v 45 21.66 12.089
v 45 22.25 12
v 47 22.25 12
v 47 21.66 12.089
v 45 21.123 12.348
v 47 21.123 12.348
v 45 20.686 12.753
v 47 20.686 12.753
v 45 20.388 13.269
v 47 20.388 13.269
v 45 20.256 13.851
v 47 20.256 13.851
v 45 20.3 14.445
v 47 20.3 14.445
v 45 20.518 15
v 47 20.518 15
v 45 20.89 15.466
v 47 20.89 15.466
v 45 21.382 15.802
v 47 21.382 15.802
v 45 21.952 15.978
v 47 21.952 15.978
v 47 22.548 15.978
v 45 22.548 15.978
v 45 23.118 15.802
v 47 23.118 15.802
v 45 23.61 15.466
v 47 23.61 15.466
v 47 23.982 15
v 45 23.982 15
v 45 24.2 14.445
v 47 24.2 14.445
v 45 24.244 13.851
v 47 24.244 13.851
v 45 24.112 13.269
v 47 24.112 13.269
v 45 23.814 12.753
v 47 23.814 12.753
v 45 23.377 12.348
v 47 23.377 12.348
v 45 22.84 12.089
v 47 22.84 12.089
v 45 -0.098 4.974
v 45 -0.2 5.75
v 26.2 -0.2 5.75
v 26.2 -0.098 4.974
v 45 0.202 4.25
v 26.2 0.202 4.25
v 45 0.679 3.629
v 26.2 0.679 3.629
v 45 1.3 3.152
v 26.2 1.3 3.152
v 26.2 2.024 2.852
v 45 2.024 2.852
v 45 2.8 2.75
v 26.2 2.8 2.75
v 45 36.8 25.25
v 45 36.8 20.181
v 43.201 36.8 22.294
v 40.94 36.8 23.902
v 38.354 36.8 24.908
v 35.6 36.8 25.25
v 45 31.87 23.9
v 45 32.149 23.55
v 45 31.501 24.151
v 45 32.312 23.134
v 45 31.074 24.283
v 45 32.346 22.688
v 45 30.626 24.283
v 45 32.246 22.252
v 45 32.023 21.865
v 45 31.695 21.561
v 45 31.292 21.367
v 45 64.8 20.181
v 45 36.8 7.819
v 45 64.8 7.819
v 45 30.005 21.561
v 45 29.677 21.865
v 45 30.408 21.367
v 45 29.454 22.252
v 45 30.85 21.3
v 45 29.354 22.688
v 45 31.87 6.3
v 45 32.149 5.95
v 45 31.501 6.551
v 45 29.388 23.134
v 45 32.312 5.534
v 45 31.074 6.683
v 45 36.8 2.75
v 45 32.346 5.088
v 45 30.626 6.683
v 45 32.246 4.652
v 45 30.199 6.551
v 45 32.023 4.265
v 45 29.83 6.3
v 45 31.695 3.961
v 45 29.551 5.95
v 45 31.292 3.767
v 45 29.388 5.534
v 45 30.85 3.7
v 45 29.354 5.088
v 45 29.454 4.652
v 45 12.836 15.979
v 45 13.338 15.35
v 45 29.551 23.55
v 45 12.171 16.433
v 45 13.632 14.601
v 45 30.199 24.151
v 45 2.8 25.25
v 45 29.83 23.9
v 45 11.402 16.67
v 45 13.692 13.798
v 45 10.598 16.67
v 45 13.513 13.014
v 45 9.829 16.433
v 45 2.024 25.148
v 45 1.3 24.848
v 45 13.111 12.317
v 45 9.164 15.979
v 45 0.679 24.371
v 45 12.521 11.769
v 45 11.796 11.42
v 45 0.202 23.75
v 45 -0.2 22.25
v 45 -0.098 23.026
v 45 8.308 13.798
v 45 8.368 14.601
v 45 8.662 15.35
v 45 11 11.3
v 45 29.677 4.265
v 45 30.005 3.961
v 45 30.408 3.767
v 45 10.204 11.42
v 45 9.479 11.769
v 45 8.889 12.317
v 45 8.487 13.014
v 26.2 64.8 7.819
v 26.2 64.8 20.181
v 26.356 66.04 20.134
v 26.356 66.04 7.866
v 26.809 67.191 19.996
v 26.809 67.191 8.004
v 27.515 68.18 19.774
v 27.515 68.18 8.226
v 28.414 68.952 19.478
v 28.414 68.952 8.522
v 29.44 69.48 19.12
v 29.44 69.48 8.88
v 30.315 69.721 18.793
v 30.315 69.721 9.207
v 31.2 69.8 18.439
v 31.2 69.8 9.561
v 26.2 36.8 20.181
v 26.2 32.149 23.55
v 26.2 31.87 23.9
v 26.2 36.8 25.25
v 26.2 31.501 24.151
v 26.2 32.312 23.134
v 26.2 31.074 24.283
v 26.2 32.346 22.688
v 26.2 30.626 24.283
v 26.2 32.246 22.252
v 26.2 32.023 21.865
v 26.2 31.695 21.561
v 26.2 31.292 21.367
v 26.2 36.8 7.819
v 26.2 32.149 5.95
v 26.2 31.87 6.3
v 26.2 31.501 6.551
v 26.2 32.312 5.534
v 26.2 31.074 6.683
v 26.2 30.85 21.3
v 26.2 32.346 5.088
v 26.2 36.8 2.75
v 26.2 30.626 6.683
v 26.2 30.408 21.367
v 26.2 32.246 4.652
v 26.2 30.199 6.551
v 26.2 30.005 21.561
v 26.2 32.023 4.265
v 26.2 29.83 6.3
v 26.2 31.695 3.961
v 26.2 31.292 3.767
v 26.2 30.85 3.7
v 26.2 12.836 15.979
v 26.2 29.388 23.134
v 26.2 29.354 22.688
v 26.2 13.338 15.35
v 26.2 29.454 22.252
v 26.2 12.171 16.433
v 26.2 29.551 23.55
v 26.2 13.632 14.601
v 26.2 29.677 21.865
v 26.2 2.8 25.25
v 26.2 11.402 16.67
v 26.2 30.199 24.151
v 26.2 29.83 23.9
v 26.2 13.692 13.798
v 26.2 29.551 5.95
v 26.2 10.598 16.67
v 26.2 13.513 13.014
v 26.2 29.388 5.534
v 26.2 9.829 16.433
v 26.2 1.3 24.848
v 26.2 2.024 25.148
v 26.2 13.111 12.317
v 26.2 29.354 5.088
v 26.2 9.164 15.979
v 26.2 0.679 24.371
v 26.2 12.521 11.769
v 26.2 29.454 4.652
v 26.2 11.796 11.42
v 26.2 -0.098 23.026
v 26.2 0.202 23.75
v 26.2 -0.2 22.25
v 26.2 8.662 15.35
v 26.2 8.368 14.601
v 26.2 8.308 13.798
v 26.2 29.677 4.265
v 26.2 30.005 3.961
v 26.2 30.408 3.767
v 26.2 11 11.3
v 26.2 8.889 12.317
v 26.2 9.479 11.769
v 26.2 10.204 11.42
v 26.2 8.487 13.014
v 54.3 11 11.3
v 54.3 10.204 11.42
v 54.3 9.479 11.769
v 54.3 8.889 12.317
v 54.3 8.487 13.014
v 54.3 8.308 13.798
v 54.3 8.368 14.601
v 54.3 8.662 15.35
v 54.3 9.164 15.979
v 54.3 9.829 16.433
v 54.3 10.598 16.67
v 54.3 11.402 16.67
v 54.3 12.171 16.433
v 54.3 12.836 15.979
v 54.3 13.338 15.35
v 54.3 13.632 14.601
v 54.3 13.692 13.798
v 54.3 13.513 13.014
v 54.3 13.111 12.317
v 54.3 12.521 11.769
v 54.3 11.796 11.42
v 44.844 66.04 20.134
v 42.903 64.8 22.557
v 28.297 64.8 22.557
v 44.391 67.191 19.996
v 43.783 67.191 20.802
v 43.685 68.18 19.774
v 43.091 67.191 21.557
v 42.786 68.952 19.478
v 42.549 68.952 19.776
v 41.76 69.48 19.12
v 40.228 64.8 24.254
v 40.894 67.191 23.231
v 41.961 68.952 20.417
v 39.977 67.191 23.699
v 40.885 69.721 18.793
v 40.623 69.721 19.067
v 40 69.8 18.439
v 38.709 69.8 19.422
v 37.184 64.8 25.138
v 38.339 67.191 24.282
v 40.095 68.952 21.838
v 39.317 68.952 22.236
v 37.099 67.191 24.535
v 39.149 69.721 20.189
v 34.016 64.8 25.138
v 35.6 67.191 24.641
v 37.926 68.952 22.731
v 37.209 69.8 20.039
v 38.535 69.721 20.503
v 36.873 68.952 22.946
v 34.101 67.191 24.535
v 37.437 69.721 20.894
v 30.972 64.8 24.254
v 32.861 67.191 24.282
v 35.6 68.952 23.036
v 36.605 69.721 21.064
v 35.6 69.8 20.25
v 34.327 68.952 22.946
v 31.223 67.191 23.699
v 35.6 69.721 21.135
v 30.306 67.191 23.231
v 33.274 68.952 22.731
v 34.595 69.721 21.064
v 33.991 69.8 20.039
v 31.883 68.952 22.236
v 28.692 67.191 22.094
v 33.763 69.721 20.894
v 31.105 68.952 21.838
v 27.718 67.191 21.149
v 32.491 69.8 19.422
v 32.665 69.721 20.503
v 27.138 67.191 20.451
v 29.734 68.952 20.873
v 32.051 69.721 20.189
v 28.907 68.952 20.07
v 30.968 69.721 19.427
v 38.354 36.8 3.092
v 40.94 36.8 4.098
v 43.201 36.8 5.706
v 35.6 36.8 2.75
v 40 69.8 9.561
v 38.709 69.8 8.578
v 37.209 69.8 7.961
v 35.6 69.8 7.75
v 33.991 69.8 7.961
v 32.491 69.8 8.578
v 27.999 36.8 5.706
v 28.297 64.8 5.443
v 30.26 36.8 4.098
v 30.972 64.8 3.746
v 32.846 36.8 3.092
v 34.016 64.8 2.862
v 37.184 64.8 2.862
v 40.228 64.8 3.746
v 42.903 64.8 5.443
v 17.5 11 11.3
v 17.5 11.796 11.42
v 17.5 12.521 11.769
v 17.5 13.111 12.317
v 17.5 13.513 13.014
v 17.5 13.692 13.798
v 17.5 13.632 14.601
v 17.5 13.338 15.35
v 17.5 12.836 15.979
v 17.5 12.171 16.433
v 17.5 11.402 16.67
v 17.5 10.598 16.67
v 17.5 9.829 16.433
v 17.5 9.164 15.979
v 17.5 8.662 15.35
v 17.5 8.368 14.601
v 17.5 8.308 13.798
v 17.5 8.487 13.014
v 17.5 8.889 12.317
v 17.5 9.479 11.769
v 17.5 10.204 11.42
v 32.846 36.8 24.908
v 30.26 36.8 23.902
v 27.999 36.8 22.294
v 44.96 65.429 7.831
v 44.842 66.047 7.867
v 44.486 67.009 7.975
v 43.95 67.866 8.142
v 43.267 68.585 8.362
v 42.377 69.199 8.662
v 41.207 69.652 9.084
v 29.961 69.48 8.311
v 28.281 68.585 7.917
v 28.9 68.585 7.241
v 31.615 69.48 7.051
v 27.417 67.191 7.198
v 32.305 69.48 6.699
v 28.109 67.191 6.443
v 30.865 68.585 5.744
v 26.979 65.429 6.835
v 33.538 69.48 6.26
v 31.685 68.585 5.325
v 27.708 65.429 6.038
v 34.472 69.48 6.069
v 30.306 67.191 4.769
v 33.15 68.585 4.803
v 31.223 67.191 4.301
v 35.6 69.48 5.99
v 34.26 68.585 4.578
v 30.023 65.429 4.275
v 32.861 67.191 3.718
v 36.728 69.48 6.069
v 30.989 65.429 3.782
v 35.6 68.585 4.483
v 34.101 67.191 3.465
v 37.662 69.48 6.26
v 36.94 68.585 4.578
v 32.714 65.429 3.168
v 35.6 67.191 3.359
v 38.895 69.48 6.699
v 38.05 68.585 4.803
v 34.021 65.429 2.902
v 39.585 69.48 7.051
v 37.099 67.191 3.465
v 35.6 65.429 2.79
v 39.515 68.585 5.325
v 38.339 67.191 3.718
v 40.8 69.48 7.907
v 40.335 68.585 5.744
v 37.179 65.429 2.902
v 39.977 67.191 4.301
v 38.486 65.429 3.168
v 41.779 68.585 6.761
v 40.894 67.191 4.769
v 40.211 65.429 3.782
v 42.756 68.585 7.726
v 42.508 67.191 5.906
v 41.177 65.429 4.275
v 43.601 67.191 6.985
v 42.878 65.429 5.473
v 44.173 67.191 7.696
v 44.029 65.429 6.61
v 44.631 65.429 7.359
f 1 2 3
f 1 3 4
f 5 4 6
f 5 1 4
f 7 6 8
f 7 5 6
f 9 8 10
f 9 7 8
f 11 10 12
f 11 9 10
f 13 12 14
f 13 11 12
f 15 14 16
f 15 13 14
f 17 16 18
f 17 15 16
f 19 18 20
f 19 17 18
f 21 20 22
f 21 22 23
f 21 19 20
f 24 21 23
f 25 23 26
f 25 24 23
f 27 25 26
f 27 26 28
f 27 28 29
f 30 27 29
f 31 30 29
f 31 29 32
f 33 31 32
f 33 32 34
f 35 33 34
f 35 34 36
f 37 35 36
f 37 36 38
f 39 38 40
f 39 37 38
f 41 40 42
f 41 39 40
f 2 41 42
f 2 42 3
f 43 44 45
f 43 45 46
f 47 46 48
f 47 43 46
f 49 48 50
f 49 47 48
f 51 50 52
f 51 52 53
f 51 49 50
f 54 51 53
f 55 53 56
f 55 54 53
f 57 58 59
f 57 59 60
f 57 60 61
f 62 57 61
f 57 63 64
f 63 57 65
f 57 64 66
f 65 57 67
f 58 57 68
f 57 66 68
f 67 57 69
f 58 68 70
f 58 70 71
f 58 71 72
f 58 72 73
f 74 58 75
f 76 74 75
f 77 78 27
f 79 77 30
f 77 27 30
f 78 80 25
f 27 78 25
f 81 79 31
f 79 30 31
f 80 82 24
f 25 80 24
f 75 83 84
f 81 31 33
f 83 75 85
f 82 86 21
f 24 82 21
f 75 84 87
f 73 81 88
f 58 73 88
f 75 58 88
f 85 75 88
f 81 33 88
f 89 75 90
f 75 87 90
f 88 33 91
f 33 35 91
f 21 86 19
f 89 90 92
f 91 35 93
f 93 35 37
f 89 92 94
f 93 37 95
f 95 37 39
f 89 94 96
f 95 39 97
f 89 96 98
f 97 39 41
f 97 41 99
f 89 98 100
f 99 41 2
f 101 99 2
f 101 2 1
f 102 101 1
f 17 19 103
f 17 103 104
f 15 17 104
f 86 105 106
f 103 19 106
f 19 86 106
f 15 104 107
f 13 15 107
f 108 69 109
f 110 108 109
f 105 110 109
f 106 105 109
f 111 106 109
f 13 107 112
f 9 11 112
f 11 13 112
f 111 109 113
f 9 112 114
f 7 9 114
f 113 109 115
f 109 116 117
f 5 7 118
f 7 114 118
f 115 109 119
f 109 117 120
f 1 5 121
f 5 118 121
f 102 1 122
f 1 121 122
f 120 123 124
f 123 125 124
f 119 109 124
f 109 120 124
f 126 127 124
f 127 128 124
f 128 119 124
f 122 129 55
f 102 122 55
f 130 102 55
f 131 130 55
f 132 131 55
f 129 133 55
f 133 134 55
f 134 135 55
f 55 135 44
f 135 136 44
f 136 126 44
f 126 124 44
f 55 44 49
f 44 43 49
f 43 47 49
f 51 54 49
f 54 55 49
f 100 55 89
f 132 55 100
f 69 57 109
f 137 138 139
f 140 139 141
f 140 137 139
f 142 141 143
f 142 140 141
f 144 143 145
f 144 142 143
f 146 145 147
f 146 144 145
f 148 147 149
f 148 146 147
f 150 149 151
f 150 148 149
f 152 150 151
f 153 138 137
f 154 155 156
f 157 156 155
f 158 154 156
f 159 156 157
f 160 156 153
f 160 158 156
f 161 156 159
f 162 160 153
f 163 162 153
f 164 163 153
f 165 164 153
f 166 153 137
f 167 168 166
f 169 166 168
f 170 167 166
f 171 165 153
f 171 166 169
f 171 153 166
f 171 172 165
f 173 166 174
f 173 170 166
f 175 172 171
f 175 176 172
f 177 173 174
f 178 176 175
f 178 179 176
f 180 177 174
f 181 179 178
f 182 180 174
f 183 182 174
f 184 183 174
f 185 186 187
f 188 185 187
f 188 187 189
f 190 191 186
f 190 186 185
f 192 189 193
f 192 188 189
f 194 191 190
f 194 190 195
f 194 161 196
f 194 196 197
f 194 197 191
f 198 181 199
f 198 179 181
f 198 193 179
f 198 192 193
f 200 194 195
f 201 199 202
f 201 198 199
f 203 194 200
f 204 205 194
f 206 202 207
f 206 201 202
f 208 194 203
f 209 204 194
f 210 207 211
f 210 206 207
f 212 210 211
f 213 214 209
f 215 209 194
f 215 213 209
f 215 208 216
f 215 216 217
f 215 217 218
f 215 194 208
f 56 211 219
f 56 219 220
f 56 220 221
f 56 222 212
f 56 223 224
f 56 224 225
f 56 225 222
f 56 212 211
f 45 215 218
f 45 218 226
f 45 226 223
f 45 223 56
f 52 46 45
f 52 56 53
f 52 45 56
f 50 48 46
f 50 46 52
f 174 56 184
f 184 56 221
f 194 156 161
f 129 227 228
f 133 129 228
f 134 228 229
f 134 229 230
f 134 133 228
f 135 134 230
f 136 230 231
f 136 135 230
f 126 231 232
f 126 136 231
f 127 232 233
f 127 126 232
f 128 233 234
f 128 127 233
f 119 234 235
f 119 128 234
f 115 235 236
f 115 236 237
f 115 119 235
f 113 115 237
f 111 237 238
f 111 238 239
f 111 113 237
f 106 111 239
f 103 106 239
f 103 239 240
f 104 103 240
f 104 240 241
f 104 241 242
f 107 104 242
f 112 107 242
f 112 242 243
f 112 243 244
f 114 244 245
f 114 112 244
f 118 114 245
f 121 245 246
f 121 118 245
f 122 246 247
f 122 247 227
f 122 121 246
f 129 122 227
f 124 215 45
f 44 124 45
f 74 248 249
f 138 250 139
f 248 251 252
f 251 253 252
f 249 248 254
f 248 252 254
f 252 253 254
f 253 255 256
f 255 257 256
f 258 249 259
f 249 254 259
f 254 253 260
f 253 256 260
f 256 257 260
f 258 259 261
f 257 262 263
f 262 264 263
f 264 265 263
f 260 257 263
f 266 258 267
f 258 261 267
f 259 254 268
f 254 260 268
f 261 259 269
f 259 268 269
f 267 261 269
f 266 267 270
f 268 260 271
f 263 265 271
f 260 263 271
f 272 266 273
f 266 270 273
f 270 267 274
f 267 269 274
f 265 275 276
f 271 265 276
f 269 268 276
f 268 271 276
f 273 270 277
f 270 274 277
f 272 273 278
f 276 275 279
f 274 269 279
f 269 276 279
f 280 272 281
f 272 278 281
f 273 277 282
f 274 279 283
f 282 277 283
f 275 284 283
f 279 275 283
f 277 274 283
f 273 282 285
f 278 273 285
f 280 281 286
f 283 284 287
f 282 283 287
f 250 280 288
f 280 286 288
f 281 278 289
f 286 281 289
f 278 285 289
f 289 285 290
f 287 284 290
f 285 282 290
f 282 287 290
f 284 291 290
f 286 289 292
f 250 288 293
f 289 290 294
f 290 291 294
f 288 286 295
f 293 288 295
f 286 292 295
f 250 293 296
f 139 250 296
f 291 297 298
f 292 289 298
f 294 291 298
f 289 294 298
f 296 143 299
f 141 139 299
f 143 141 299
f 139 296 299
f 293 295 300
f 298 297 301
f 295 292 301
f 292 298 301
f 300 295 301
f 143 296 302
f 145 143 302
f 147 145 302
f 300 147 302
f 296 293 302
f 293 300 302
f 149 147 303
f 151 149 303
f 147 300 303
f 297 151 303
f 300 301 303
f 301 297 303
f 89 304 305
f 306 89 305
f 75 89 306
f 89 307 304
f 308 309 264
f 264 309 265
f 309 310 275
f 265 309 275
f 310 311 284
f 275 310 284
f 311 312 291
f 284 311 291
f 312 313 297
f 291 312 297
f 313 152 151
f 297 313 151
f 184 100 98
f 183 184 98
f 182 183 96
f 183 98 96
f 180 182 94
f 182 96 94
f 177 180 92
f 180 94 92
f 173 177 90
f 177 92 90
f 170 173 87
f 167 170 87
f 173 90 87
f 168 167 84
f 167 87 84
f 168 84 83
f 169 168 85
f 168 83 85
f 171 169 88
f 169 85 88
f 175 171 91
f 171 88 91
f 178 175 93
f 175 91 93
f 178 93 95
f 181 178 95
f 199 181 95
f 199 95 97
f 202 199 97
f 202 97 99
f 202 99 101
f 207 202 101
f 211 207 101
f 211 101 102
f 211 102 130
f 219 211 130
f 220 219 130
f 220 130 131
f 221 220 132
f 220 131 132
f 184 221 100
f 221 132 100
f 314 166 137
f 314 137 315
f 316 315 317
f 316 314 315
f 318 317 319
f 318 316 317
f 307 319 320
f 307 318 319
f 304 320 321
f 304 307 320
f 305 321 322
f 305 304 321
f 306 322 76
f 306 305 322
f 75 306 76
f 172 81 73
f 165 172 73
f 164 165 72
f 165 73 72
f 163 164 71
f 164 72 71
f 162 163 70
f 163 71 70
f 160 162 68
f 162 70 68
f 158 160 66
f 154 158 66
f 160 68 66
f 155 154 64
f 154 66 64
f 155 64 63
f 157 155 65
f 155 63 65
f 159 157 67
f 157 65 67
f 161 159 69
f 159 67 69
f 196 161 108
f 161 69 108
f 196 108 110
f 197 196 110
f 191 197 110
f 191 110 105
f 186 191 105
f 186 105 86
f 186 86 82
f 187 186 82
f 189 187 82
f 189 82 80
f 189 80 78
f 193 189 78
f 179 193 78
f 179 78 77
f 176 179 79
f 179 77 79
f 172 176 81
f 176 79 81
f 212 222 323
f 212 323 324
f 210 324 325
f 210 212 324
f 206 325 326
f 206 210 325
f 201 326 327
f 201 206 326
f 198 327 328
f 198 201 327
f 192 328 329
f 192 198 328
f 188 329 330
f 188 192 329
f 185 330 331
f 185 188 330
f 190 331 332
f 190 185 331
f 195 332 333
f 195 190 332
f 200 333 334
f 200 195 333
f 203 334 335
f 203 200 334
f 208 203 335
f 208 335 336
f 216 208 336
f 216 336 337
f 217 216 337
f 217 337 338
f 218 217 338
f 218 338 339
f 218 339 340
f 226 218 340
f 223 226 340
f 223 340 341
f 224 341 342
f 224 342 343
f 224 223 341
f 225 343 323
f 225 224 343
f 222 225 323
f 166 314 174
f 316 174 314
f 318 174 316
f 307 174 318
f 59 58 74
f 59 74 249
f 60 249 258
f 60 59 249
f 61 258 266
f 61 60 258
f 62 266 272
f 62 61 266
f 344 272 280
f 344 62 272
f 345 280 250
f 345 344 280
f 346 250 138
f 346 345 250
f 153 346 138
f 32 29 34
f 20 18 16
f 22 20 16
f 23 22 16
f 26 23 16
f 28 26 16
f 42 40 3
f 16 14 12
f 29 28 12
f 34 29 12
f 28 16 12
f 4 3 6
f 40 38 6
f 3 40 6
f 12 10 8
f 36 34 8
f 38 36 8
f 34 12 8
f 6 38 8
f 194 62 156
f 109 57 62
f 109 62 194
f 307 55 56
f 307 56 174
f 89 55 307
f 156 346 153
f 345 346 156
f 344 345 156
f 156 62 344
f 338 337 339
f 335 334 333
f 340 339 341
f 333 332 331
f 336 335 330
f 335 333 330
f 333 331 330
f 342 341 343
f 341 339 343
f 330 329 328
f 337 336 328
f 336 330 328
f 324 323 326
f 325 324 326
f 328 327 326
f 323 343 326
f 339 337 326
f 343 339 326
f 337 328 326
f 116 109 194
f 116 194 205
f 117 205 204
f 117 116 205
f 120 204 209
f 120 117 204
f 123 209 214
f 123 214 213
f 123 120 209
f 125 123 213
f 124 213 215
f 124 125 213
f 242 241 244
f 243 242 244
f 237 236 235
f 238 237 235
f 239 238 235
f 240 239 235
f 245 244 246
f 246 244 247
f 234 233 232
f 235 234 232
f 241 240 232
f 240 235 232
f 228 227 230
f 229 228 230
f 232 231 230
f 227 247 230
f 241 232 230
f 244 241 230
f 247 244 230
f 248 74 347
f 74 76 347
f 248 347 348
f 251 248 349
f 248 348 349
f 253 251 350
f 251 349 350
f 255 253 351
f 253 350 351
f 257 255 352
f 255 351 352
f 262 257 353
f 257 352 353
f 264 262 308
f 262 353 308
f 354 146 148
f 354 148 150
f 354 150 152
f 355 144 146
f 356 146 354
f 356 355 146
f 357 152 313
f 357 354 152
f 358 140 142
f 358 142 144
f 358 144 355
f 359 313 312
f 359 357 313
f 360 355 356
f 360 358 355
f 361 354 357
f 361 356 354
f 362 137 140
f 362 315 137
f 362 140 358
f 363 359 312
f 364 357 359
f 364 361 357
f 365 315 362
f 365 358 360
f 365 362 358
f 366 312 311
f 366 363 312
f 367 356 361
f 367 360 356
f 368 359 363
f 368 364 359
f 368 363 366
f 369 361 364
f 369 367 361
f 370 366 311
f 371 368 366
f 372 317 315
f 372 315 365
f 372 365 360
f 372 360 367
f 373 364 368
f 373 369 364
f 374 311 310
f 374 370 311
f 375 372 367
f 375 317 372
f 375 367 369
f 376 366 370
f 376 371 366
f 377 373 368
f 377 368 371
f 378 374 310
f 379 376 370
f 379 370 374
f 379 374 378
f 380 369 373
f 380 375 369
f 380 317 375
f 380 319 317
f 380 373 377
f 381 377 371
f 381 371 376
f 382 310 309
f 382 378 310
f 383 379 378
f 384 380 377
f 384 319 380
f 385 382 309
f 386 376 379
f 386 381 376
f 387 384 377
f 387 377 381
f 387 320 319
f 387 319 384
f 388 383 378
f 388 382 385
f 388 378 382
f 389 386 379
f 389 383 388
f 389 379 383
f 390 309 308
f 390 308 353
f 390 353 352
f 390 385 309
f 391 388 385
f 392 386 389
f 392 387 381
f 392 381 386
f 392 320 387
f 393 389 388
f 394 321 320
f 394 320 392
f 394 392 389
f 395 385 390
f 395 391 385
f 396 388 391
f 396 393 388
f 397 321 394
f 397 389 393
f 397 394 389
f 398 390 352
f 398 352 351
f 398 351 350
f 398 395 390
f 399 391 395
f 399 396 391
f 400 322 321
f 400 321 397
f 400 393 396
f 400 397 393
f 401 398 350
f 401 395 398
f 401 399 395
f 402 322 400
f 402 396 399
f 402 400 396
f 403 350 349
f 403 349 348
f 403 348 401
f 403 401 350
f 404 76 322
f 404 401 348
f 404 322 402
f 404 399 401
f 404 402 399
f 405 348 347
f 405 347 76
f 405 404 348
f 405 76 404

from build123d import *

# Parameters (mm, degrees)
SKETCH020_R             = 1.5
PAD012_DEPTH            = 18.8
SKETCH022_R             = 2.7
PAD010_DEPTH            = 8.7
SKETCH023_R             = 2.7
PAD011_DEPTH            = 9.3
PAD003_DEPTH            = 33
FILLET001_R             = 5
SKETCH021_R             = 2
PAD013_DEPTH            = 2
BODY005_PLACEMENT_ANGLE = 90


with BuildPart() as motores_tt:
    # Sketch020 → Pad012 (new body)
    with BuildSketch(Plane.XY):
        with BuildLine():
            Line((-8.25, -11.2), (8.25, -11.2))
            ThreePointArc((8.25, -11.2), (10.3713203436, -10.3213203436), (11.25, -8.2))
            Line((11.25, -8.2), (11.25, 25.8))
            Line((11.25, 25.8), (-11.25, 25.8))
            Line((-11.25, 25.8), (-11.25, -8.2))
            ThreePointArc((-11.25, -8.2), (-10.3713203436, -10.3213203436), (-8.25, -11.2))
        make_face()
        with Locations((-8.8, 19.85)):
            Circle(SKETCH020_R, mode=Mode.SUBTRACT)
        with Locations((8.8, 19.85)):
            Circle(SKETCH020_R, mode=Mode.SUBTRACT)
    extrude(amount=PAD012_DEPTH)

    # Sketch022 (on Face10 of Pad012) → Pad010 (join)
    with BuildSketch(Plane.XY.offset(18.8)):
        Circle(SKETCH022_R)
    extrude(amount=PAD010_DEPTH)

    # Sketch023 (on Face4 of Pad010) → Pad011 (join)
    with BuildSketch(Plane(origin=(0, 0, 0), x_dir=(1, 0, 0), z_dir=(0, 0, -1))):
        Circle(SKETCH023_R)
    extrude(amount=PAD011_DEPTH)

    # Sketch024 (on Face8 of Pad011) → Pad003 (join)
    with BuildSketch(Plane(origin=(0, 25.8, 0), x_dir=(-1, 0, 0), z_dir=(0, 1, 0))):
        with BuildLine():
            ThreePointArc((6.1808170981, 0), (11.25, 9.4), (6.1808170981, 18.8))
            Line((6.1808170981, 18.8), (-6.1808170981, 18.8))
            ThreePointArc((-6.1808170981, 18.8), (-11.25, 9.4), (-6.1808170981, 0))
            Line((6.1808170981, 0), (-6.1808170981, 0))
        make_face()
    extrude(amount=PAD003_DEPTH)

    # Fillet001
    fillet001_edges = [motores_tt.edges().sort_by_distance(p)[0] for p in [
        (-11.25, 58.8, 9.4),
        (0, 58.8, 18.8),
        (11.25, 58.8, 9.4),
        (0, 58.8, 0),
    ]]
    fillet(fillet001_edges, radius=FILLET001_R)

    # Sketch021 (on Face4 of Fillet001) → Pad013 (join)
    with BuildSketch(Plane(origin=(0, 0, 0), x_dir=(1, 0, 0), z_dir=(0, 0, -1))):
        with Locations((0, -11.25)):
            Circle(SKETCH021_R)
    extrude(amount=PAD013_DEPTH)


with BuildPart() as motores_tt_1:
    # Body005 placement: moved
    add(motores_tt.part.moved(Location((-45, 11, 14))).rotate(Axis((-45, 11, 14), (0, 1, 0)), BODY005_PLACEMENT_ANGLE))


with BuildPart() as part_mirroring:
    # Part__Mirroring: instance of Motores_TT
    add(motores_tt_1.part.mirror(Plane(origin=(0, 34.7999992371, 13.9999961853), x_dir=(0, -1, 0), z_dir=(1, 0, -1.192e-07))))


solid = part_mirroring.part
